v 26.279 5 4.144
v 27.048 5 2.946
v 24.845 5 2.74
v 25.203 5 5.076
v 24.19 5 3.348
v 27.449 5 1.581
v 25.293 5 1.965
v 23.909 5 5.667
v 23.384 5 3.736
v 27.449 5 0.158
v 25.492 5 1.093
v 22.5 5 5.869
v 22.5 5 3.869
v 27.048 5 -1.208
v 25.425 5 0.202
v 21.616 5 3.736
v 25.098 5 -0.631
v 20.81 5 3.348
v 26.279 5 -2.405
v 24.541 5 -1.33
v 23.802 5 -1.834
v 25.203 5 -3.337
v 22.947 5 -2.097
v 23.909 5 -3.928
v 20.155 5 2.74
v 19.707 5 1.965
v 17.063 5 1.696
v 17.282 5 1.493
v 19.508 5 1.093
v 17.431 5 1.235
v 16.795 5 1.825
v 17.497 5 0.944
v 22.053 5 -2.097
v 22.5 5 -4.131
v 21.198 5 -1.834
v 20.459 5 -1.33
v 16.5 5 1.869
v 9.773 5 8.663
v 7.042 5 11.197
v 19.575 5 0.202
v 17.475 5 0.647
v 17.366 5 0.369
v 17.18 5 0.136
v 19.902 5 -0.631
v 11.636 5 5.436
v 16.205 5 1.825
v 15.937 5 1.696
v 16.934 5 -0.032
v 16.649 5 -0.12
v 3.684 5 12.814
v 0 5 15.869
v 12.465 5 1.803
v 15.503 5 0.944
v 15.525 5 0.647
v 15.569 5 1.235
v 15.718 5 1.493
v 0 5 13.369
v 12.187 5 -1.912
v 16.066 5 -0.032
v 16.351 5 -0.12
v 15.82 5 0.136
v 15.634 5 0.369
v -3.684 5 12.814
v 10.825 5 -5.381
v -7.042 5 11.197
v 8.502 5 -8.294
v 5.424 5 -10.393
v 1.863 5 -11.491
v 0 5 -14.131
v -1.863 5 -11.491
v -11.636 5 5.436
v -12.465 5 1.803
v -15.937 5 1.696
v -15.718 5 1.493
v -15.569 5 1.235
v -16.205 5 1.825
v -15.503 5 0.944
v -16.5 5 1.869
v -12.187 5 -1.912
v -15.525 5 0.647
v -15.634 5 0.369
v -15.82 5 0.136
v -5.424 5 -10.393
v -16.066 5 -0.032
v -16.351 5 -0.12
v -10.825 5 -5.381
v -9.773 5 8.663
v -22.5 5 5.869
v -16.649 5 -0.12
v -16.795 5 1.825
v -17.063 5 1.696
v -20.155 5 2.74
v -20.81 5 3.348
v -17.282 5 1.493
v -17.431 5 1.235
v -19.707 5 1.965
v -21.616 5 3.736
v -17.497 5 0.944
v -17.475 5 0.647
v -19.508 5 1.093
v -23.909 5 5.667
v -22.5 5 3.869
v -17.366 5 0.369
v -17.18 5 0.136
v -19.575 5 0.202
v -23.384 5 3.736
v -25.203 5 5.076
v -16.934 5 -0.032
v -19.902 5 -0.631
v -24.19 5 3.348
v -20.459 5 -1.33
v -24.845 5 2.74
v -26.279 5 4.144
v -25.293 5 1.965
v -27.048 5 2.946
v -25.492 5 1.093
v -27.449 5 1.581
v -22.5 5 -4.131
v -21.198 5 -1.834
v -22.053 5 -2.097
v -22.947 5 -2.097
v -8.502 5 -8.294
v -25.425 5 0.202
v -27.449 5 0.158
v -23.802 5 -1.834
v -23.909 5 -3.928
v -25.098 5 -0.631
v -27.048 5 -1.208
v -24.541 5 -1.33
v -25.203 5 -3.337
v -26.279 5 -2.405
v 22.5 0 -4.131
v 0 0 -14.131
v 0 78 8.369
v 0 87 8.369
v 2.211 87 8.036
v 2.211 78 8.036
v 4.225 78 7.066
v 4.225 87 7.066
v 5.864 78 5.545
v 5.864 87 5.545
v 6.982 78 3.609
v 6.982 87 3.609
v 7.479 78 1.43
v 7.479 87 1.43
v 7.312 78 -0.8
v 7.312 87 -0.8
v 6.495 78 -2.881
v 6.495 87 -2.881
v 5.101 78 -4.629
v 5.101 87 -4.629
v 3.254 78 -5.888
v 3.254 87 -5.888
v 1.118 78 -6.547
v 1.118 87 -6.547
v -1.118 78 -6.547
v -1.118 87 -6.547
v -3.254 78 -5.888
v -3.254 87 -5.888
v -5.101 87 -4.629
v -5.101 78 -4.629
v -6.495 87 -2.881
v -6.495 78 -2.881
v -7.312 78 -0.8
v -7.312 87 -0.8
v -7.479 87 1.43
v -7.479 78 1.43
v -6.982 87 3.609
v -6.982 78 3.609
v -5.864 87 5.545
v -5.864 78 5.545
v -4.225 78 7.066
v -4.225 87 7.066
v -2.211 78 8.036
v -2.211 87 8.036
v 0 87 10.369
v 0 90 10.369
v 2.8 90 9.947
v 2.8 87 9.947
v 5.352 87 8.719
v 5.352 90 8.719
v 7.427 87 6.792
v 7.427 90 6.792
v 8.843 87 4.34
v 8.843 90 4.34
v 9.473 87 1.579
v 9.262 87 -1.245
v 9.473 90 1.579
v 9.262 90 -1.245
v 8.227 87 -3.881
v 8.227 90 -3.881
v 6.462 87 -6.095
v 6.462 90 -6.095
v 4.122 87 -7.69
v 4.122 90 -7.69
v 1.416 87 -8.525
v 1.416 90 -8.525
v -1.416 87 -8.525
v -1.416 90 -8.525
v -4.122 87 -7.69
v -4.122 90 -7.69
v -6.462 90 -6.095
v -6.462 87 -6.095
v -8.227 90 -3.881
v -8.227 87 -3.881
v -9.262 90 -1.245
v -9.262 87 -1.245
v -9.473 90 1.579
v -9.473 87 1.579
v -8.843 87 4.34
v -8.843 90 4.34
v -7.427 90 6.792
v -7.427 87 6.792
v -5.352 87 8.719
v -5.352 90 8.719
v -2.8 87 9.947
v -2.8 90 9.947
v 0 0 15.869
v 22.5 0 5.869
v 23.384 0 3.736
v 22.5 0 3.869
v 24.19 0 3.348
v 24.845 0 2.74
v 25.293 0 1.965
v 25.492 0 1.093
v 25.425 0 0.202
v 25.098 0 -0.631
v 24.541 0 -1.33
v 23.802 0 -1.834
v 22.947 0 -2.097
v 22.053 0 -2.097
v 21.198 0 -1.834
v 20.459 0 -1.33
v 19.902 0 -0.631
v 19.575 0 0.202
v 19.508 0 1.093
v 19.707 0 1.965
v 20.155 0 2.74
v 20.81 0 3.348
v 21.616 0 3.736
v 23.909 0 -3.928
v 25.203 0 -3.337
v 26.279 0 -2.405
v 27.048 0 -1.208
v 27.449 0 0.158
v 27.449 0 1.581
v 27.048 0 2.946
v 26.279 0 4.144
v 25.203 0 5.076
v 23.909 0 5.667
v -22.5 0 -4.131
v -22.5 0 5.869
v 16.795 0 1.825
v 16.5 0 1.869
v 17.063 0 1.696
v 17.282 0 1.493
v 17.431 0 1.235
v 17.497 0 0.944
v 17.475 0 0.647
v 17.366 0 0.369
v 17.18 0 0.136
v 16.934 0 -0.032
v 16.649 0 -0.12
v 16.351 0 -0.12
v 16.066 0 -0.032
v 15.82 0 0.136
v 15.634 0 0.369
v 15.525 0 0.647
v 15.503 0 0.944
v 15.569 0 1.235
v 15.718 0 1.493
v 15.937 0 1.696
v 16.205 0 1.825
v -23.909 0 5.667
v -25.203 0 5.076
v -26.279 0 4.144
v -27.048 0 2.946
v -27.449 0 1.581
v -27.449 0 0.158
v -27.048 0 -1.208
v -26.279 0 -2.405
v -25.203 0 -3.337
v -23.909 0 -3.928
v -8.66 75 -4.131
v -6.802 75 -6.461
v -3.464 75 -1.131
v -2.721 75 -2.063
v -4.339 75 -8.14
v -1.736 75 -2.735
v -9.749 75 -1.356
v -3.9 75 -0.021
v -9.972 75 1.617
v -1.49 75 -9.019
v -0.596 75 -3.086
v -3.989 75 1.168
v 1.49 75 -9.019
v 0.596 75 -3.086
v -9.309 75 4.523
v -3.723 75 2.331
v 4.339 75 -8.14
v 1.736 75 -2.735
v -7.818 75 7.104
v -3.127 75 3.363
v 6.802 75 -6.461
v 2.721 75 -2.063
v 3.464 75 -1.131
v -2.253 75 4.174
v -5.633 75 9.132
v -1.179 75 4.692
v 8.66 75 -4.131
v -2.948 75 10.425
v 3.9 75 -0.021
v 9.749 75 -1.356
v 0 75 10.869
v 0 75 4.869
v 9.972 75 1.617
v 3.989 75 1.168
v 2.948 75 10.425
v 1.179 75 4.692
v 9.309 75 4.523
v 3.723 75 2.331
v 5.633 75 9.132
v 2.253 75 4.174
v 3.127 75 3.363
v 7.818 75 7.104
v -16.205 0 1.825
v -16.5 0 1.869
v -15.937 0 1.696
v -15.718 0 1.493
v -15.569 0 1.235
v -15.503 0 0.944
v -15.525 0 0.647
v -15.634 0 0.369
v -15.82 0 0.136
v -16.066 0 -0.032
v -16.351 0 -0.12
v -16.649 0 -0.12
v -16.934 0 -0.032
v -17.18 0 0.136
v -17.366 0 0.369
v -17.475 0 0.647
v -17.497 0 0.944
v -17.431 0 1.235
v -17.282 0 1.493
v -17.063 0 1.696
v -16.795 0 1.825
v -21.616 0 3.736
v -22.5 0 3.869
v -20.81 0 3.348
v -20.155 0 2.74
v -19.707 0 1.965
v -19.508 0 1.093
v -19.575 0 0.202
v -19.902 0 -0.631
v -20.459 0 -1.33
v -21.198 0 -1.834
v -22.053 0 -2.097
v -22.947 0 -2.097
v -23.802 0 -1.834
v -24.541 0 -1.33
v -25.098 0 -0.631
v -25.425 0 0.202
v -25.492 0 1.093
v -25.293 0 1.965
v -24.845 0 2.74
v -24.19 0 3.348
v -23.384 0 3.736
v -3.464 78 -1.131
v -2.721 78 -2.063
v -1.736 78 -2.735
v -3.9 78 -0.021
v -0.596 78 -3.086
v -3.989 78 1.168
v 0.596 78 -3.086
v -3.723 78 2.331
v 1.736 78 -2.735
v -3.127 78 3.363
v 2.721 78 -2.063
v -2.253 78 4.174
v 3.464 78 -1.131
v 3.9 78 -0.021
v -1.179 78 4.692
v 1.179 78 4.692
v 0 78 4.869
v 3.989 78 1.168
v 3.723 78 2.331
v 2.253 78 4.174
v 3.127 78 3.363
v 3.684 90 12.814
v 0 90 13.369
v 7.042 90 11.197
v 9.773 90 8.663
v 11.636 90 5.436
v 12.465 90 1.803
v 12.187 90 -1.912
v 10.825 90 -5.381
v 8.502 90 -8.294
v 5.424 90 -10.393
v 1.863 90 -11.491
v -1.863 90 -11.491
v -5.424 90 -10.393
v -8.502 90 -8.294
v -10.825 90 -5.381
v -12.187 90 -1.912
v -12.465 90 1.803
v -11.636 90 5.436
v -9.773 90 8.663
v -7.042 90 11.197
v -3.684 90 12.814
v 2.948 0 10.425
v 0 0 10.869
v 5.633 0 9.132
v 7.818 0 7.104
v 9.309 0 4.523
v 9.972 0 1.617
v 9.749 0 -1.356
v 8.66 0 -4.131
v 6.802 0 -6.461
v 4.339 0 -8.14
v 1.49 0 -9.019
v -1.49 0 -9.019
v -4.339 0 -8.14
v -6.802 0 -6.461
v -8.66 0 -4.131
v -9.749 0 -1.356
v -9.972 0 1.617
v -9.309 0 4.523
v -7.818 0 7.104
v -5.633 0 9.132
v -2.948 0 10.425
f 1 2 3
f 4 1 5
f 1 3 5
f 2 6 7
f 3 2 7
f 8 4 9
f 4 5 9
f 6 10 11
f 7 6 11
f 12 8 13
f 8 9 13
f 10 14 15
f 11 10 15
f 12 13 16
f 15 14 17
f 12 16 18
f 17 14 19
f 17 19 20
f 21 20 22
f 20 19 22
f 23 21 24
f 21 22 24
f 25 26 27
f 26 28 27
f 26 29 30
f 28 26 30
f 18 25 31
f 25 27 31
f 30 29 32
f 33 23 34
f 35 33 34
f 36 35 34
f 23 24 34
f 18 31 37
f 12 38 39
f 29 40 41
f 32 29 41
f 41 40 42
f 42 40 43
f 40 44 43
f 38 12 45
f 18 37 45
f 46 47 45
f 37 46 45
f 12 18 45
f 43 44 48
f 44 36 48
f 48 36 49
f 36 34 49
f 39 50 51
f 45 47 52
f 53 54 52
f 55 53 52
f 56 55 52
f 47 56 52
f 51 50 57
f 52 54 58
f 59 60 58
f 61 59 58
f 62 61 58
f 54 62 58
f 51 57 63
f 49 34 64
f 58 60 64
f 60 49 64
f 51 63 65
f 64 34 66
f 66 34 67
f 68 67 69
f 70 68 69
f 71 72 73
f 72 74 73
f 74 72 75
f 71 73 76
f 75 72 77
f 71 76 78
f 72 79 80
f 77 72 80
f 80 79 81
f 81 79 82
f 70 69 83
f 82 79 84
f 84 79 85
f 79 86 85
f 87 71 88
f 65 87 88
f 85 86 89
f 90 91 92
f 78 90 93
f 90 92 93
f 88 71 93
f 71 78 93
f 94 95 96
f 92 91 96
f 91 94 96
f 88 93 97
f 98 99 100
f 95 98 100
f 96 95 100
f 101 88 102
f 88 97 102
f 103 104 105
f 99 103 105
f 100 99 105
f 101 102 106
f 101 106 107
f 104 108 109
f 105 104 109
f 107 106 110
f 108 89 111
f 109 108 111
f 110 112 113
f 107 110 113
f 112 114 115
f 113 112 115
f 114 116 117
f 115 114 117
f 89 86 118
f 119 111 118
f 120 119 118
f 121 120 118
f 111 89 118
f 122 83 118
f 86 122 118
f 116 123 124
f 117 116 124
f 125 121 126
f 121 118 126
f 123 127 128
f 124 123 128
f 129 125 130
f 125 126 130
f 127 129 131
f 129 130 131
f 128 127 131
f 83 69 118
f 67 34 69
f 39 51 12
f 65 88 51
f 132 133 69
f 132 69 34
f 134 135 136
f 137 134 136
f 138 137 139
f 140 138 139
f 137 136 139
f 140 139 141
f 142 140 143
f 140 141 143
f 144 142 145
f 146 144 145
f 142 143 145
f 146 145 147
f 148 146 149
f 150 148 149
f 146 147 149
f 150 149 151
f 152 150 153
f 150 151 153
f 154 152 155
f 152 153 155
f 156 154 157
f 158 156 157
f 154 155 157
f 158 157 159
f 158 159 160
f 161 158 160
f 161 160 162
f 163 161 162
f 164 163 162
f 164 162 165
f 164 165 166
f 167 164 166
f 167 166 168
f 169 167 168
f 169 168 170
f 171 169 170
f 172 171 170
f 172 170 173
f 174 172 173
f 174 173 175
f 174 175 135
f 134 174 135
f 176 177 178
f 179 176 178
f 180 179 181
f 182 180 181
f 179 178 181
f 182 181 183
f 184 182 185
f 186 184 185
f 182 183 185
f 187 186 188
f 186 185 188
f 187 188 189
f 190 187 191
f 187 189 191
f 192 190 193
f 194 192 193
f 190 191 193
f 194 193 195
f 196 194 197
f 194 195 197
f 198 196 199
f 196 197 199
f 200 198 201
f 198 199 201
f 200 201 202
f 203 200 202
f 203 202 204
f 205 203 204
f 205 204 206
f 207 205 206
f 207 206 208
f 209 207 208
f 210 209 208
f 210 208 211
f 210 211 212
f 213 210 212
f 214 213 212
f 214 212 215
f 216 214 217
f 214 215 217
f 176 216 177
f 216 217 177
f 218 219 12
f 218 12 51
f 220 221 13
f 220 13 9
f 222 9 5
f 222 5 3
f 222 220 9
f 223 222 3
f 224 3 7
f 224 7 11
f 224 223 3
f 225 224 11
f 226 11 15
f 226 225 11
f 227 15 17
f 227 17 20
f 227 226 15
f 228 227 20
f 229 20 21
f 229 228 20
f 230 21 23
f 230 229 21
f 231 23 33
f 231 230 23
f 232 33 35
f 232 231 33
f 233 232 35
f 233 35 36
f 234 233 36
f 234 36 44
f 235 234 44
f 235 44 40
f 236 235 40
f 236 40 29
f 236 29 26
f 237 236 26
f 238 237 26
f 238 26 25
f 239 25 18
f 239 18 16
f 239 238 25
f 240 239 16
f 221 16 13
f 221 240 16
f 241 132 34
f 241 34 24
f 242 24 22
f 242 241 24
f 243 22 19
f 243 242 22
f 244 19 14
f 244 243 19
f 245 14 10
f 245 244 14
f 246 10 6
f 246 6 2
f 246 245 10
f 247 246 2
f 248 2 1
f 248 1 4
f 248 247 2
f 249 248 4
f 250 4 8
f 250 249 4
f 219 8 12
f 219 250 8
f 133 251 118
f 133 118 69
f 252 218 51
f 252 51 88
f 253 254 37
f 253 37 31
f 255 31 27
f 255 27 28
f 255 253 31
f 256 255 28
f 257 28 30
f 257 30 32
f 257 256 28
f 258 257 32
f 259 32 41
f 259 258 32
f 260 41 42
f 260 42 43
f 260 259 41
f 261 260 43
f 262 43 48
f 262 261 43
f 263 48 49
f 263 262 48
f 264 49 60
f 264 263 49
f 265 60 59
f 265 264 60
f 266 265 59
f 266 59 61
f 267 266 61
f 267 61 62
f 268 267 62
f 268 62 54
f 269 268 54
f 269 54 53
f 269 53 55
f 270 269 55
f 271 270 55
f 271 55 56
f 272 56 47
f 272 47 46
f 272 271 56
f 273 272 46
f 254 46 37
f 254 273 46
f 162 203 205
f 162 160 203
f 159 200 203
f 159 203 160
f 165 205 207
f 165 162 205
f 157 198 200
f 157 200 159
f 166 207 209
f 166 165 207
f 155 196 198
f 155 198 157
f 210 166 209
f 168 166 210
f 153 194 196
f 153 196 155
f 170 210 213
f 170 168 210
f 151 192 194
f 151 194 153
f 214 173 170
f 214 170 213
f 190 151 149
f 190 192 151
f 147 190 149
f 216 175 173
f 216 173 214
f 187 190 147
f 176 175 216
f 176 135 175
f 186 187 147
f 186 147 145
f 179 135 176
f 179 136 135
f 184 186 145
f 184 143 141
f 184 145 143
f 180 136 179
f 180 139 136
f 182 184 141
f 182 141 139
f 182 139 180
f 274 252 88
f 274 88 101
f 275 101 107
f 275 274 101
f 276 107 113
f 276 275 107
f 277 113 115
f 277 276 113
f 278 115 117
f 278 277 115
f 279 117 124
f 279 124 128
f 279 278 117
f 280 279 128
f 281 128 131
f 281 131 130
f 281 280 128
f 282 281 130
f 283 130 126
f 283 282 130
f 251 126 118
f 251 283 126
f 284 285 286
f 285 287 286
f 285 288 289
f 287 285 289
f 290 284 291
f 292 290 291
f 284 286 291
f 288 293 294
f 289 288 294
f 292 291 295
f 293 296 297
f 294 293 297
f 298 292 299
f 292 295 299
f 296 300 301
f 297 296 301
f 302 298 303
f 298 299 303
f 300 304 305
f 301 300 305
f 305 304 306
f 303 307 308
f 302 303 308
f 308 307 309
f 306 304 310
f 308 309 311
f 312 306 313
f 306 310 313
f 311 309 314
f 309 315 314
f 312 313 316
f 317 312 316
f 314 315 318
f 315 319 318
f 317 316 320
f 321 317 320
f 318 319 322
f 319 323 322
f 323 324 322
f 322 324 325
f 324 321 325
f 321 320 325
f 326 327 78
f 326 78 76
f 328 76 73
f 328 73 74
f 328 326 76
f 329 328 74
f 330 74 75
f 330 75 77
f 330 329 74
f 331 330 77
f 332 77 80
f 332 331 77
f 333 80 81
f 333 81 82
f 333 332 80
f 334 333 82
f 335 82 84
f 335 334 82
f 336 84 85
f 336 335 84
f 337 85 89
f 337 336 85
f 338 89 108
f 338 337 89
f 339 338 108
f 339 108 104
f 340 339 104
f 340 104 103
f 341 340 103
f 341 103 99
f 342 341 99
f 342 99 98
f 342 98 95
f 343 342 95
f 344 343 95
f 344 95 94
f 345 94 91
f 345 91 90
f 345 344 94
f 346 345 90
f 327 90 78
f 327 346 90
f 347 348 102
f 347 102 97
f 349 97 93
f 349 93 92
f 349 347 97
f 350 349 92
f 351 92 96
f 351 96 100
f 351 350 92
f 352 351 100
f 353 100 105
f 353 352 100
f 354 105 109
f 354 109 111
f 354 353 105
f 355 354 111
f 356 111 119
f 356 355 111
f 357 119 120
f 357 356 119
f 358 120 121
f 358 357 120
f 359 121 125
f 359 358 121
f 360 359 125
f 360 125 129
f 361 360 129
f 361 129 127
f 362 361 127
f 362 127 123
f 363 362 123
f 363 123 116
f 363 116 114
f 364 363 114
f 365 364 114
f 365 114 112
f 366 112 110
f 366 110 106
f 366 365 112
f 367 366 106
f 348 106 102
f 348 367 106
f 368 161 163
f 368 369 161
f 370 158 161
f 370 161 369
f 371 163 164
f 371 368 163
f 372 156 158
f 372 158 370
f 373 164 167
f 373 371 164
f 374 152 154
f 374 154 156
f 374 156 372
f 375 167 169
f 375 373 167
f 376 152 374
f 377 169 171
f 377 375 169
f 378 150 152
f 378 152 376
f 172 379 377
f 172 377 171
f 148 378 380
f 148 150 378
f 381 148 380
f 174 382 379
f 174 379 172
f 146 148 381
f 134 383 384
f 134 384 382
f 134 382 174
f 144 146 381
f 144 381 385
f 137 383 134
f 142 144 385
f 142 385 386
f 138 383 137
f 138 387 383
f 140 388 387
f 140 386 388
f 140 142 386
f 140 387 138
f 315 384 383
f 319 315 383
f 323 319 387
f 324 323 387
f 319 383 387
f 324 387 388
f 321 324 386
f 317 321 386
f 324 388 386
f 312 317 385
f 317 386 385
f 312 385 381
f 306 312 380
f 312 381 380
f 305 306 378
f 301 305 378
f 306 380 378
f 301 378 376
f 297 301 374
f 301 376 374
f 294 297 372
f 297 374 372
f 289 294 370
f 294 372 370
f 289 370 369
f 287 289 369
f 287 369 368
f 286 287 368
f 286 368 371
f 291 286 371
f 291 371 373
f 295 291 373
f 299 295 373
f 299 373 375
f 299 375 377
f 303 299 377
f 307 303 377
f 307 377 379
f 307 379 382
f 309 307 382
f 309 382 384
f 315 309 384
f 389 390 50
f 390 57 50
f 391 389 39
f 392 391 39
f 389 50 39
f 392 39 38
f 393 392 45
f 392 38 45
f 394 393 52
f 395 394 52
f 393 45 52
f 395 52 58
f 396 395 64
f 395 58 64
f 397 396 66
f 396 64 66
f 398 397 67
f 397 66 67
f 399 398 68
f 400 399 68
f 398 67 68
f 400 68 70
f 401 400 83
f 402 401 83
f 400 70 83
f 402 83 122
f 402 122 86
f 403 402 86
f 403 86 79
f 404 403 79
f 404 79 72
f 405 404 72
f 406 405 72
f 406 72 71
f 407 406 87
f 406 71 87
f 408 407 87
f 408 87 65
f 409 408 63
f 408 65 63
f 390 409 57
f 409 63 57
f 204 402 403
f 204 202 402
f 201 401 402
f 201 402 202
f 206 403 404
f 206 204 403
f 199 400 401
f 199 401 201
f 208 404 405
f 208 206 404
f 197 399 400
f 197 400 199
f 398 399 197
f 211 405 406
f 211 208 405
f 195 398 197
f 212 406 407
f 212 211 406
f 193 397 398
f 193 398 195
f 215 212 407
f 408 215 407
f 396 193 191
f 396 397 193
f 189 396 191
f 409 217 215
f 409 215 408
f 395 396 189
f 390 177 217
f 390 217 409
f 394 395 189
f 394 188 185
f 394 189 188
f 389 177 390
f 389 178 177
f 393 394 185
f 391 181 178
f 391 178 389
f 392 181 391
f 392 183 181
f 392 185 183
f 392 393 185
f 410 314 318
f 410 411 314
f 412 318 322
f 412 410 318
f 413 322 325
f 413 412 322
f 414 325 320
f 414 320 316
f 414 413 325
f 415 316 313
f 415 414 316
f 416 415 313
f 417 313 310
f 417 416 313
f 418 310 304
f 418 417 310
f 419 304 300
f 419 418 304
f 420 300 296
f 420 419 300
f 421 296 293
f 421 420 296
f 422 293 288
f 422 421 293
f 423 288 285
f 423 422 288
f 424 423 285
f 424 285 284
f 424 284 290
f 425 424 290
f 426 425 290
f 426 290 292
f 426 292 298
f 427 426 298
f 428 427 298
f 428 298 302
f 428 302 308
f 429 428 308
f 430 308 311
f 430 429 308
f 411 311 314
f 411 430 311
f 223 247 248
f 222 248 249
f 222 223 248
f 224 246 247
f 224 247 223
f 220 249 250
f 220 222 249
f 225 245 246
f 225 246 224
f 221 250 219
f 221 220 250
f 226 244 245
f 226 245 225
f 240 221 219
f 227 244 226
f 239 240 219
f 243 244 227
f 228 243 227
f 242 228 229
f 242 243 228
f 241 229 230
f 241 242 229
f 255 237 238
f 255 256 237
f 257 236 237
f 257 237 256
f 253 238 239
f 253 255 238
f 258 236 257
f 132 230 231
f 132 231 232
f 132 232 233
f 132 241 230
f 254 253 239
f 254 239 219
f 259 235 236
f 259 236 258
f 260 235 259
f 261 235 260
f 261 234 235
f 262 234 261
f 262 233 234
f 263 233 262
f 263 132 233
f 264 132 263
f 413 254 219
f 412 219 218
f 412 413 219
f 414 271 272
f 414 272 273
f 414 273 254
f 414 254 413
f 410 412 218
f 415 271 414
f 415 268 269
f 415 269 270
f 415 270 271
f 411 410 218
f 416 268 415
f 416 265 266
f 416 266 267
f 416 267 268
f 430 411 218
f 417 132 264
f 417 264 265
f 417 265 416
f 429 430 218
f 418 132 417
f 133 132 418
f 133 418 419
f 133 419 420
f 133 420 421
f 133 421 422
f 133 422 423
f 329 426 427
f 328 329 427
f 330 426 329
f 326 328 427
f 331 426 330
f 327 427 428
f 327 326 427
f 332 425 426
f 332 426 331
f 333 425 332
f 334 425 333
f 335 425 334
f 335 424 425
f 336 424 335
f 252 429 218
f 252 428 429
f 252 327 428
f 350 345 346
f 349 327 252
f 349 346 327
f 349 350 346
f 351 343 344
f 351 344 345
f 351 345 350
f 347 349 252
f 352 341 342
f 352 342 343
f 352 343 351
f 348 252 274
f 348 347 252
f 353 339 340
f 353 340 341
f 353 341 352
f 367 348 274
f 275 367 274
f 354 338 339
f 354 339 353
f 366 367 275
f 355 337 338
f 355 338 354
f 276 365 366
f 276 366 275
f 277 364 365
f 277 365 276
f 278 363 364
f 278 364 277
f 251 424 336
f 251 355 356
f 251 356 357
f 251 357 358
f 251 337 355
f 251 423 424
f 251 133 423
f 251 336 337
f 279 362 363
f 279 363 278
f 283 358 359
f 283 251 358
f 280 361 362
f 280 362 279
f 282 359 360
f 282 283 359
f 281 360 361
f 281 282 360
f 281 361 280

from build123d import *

# Parameters (mm, degrees)
SKETCH_1_R          = 3
SKETCH_1_R_2        = 10
SKETCH_1_R_3        = 1
EXTRUDE_1_DEPTH     = 5
SKETCH_2_R          = 12.5
SKETCH_2_R_2        = 10
EXTRUDE_2_DEPTH     = 70
SKETCH_3_R          = 12.5
EXTRUDE_3_DEPTH     = 15
SKETCH_4_R          = 4
CUT_EXTRUDE_1_DEPTH = 96.436281211
SKETCH_5_R          = 7.5
CUT_EXTRUDE_2_DEPTH = 12
SKETCH_6_R          = 9.5
CUT_EXTRUDE_3_DEPTH = 3


with BuildPart() as part:
    # Эскиз1 → Бобышка-Вытянуть1 (new body)
    with BuildSketch(Plane(origin=(0, 0, 0), x_dir=(1, 0, 0), z_dir=(0, 1, 0))):
        with BuildLine():
            Line((-22.5, 4.130728704), (0, 14.130728704))
            Line((0, 14.130728704), (22.5, 4.130728704))
            ThreePointArc((22.5, 4.130728704), (27.5, -0.869271296), (22.5, -5.869271296))
            Line((22.5, -5.869271296), (0, -15.869271296))
            Line((0, -15.869271296), (-22.5, -5.869271296))
            ThreePointArc((-22.5, -5.869271296), (-27.5, -0.869271296), (-22.5, 4.130728704))
        make_face()
        with Locations(Location((-22.5, -0.869271296, 0), (0, 0, 270))):
            Circle(SKETCH_1_R, mode=Mode.SUBTRACT)
        with Locations(Location((0, -0.869271296, 0), (0, 0, 270))):
            Circle(SKETCH_1_R_2, mode=Mode.SUBTRACT)
        with Locations(Location((22.5, -0.869271296, 0), (0, 0, 270))):
            Circle(SKETCH_1_R, mode=Mode.SUBTRACT)
        with Locations(Location((-16.5, -0.869271296, 0), (0, 0, 270))):
            Circle(SKETCH_1_R_3, mode=Mode.SUBTRACT)
        with Locations(Location((16.5, -0.869271296, 0), (0, 0, 270))):
            Circle(SKETCH_1_R_3, mode=Mode.SUBTRACT)
    extrude(amount=EXTRUDE_1_DEPTH)

    # Эскиз2 → Бобышка-Вытянуть2 (add)
    with BuildSketch(Plane(origin=(0, 5, 0), x_dir=(1, 0, 0), z_dir=(0, 1, 0))):
        with Locations(Location((0, -0.869271296, 0), (0, 0, 270))):
            Circle(SKETCH_2_R)
        with Locations(Location((0, -0.869271296, 0), (0, 0, 270))):
            Circle(SKETCH_2_R_2, mode=Mode.SUBTRACT)
    extrude(amount=EXTRUDE_2_DEPTH)

    # Эскиз3 → Бобышка-Вытянуть3 (add)
    with BuildSketch(Plane(origin=(0, 75, 0), x_dir=(1, 0, 0), z_dir=(0, 1, 0))):
        with Locations(Location((0, -0.869271296, 0), (0, 0, 270))):
            Circle(SKETCH_3_R)
    extrude(amount=EXTRUDE_3_DEPTH)

    # Эскиз4 → Вырез-Вытянуть1 (cut, through all)
    with BuildSketch(Plane(origin=(0, 90, 0), x_dir=(1, 0, 0), z_dir=(0, 1, 0))):
        with Locations(Location((0, -0.869271296, 0), (0, 0, 270))):
            Circle(SKETCH_4_R)
    extrude(amount=-CUT_EXTRUDE_1_DEPTH, mode=Mode.SUBTRACT)

    # Эскиз5 → Вырез-Вытянуть2 (cut)
    with BuildSketch(Plane(origin=(0, 90, 0), x_dir=(1, 0, 0), z_dir=(0, 1, 0))):
        with Locations(Location((0, -0.869271296, 0), (0, 0, 270))):
            Circle(SKETCH_5_R)
    extrude(amount=-CUT_EXTRUDE_2_DEPTH, mode=Mode.SUBTRACT)

    # Эскиз6 → Вырез-Вытянуть3 (cut)
    with BuildSketch(Plane(origin=(0, 90, 0), x_dir=(1, 0, 0), z_dir=(0, 1, 0))):
        with Locations(Location((0, -0.869271296, 0), (0, 0, 270))):
            Circle(SKETCH_6_R)
    extrude(amount=-CUT_EXTRUDE_3_DEPTH, mode=Mode.SUBTRACT)


solid = part.part
